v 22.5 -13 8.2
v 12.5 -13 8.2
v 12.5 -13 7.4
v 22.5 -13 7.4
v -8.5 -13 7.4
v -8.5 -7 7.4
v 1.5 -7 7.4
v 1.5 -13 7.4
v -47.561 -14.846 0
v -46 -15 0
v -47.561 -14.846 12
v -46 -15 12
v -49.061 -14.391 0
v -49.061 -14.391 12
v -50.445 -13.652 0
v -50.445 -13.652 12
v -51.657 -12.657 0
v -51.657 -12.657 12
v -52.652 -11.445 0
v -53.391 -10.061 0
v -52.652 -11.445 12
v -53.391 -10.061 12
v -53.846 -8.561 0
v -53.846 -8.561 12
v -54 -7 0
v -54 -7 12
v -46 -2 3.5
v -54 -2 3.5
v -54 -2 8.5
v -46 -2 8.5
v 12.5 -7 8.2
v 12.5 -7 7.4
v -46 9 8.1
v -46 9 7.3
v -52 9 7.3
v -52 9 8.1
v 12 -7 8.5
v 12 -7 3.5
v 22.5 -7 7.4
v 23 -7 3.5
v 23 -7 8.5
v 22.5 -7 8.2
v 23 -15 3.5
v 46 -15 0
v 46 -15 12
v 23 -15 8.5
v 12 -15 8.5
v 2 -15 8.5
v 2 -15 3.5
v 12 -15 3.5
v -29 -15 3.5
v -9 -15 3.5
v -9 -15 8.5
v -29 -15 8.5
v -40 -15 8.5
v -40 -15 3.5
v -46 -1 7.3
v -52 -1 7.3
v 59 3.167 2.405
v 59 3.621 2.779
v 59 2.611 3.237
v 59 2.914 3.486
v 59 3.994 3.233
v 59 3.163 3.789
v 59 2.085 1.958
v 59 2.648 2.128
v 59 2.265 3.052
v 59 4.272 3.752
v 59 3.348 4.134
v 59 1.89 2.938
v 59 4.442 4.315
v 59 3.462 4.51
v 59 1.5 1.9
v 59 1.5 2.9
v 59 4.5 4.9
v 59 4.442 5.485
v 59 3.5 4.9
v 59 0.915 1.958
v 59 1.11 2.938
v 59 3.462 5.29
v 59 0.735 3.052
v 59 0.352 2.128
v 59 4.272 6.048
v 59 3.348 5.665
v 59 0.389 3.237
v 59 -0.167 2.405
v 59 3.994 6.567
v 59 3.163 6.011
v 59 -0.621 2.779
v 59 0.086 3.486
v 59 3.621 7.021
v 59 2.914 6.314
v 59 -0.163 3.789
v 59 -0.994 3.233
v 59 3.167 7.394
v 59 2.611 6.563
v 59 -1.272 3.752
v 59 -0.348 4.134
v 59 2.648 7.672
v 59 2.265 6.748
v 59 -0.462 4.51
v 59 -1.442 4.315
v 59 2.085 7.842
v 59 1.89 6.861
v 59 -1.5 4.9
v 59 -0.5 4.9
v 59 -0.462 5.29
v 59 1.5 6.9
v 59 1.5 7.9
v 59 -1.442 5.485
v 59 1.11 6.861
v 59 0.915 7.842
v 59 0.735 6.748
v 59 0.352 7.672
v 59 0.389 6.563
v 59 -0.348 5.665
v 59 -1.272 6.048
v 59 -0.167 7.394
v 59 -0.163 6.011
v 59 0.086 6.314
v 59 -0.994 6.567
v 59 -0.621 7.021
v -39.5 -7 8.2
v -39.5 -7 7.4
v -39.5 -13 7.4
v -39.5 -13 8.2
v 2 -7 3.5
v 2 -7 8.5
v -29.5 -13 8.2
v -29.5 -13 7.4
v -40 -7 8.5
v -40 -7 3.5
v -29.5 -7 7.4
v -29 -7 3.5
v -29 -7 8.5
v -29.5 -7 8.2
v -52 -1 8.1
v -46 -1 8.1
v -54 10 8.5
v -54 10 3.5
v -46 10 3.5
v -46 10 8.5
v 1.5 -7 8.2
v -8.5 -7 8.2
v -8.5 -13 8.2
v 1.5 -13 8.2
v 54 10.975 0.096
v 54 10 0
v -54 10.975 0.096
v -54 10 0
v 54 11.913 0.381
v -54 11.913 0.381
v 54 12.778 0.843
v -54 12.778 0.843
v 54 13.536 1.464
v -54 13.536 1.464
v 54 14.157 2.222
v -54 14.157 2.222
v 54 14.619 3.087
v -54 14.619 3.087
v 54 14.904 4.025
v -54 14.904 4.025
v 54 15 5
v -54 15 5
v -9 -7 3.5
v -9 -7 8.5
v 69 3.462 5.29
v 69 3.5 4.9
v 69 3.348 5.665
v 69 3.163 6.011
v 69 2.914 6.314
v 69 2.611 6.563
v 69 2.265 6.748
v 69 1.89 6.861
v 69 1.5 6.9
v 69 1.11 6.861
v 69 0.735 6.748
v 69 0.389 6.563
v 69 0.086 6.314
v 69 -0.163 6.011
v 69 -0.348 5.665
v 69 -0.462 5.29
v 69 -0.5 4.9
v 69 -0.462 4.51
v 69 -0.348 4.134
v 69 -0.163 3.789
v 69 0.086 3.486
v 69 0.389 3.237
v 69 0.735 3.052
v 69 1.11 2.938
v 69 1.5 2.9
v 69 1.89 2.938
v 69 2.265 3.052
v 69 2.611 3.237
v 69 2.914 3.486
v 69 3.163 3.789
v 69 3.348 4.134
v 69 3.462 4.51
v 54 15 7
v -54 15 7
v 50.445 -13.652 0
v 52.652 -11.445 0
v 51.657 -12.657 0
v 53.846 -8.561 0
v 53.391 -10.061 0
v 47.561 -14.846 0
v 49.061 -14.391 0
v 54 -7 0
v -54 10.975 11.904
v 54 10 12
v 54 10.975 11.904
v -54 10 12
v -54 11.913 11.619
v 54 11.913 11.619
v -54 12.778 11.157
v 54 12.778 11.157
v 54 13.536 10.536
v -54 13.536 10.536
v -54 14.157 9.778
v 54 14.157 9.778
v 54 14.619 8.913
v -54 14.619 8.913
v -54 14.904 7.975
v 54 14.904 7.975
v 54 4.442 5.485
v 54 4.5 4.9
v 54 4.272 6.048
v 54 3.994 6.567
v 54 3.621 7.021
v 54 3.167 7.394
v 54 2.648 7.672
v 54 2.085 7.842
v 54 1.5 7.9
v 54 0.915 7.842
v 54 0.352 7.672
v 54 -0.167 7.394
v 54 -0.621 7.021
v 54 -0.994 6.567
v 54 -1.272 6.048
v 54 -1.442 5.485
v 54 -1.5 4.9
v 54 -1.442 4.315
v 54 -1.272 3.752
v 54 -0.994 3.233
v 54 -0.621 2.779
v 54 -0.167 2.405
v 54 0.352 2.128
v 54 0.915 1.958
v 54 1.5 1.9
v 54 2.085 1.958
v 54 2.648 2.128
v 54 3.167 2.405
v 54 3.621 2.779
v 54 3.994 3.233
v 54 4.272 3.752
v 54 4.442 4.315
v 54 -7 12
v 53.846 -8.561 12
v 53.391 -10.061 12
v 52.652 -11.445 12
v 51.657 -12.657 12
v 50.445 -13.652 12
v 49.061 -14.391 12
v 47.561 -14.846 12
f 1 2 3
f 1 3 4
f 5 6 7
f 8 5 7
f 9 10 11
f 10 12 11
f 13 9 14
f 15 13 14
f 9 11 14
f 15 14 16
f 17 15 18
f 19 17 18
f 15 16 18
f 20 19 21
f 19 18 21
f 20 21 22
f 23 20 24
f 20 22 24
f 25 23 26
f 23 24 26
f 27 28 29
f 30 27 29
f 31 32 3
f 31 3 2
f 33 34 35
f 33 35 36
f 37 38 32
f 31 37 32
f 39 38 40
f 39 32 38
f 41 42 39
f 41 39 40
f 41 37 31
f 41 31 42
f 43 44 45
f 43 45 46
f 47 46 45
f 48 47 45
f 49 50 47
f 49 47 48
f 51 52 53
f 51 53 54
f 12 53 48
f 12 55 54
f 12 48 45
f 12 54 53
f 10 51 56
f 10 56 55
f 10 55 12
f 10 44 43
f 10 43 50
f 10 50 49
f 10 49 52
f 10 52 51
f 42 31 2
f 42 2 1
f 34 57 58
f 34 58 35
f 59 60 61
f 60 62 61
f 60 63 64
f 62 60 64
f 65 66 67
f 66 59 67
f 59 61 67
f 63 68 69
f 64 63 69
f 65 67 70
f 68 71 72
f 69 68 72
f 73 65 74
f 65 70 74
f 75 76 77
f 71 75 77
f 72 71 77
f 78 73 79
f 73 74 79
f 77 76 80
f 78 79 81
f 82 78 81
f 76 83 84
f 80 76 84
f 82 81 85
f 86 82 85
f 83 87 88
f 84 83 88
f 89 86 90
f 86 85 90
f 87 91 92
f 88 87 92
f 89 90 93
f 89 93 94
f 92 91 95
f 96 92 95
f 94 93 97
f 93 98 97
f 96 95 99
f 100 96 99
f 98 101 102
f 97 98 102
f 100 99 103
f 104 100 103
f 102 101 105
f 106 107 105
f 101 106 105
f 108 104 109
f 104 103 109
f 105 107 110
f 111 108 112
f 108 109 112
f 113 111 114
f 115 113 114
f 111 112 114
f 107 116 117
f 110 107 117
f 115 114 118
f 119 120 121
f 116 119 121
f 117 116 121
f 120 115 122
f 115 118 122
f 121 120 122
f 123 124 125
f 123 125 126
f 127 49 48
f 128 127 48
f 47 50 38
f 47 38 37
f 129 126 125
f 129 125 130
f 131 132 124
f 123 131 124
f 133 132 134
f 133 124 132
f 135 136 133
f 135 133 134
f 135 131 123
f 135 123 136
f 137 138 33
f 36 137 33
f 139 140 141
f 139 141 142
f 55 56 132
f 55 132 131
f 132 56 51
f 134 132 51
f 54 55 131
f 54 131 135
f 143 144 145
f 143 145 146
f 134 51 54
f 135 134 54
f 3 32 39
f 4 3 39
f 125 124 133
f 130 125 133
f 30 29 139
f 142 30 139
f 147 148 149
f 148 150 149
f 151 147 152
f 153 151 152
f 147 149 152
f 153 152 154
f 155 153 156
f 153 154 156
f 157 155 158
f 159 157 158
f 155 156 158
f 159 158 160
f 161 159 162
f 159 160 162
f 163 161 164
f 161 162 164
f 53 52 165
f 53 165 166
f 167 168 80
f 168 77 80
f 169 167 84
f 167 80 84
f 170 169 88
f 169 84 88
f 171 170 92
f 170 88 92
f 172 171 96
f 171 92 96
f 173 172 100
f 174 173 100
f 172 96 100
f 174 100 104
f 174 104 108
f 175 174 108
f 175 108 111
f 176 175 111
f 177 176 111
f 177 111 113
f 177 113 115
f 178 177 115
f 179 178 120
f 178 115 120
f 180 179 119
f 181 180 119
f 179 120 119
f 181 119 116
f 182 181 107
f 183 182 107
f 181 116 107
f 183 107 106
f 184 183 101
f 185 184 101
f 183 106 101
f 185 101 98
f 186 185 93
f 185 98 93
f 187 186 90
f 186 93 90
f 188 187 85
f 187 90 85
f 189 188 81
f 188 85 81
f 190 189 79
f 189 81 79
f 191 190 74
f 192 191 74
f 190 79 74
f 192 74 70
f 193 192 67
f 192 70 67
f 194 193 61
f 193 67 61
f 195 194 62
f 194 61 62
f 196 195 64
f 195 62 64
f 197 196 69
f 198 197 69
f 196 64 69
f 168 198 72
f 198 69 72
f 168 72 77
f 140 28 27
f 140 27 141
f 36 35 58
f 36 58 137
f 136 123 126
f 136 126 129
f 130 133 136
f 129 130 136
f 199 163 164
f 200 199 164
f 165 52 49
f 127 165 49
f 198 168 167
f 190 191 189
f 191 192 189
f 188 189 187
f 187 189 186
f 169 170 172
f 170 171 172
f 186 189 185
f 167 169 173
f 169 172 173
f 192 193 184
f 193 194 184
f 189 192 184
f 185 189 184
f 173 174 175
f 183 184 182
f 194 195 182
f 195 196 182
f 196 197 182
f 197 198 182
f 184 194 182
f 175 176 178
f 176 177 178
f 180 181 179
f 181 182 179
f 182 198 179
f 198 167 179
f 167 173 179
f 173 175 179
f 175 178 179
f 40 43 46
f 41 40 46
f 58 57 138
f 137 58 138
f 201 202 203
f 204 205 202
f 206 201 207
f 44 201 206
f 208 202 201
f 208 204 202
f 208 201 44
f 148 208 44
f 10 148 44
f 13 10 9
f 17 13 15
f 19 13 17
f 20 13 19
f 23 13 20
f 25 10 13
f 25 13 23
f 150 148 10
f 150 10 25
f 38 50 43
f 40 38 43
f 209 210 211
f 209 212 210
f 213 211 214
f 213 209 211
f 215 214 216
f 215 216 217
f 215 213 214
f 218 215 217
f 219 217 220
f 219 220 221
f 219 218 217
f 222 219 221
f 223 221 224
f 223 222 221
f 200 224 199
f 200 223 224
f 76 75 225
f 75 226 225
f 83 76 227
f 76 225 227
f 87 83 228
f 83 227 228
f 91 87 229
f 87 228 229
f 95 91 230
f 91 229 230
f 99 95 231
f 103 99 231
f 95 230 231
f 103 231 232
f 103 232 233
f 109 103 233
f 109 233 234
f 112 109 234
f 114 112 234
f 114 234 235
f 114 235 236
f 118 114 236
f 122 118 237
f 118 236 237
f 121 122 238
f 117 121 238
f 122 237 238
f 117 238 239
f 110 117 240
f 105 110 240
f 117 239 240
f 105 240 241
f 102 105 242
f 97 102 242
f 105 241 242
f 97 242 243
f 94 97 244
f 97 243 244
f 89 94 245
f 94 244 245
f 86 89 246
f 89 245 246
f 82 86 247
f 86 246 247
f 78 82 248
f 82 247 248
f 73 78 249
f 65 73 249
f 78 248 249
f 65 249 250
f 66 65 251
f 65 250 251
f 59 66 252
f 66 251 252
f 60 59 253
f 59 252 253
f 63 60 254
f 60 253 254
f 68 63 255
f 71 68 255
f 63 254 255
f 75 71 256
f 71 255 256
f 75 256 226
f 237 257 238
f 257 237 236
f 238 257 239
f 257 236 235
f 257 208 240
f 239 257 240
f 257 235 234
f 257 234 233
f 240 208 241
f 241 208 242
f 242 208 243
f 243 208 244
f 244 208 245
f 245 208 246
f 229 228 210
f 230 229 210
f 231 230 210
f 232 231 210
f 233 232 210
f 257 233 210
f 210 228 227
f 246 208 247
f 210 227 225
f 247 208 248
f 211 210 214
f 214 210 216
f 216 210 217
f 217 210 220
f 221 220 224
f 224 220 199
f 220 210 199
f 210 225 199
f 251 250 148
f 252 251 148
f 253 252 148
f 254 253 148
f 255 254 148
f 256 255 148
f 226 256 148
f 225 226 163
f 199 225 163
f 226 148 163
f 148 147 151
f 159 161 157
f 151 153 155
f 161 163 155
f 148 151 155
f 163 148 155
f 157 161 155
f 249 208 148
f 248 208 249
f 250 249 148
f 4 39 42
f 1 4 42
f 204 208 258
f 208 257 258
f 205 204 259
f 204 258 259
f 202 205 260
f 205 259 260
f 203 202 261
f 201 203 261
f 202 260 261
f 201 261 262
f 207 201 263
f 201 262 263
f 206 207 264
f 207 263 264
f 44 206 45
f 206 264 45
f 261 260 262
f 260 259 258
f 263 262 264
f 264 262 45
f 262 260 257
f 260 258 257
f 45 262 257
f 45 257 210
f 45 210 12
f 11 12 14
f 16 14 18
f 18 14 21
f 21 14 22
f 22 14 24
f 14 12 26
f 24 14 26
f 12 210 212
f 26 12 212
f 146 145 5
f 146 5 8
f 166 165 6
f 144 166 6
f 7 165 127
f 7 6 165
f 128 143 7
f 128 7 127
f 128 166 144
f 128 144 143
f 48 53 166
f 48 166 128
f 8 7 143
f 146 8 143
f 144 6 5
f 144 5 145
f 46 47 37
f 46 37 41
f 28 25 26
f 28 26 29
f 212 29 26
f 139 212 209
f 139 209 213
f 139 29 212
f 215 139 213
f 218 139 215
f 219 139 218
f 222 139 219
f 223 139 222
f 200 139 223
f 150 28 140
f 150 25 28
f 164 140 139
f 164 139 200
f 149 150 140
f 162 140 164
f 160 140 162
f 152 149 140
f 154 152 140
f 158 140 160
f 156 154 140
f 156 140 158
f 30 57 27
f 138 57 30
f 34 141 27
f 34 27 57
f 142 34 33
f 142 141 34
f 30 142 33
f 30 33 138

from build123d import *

# Parameters (mm, degrees)
SKETCH_1_W          = 108
SKETCH_1_H          = 30
EXTRUDE_1_DEPTH     = 12
SKETCH_2_W          = 5
SKETCH_2_H          = 12
CUT_EXTRUDE_1_DEPTH = 8
SKETCH_3_W          = 0.8
SKETCH_3_H          = 10
EXTRUDE_2_DEPTH     = 6
SKETCH_4_W          = 11
SKETCH_4_H          = 5
CUT_EXTRUDE_2_DEPTH = 8
SKETCH_5_W          = 10
SKETCH_5_H          = 0.8
EXTRUDE_3_DEPTH     = 6
SKETCH_6_W          = 11
SKETCH_6_H          = 5
CUT_EXTRUDE_3_DEPTH = 8
SKETCH_7_W          = 10
SKETCH_7_H          = 0.8
EXTRUDE_4_DEPTH     = 6
SKETCH_8_W          = 11
SKETCH_8_H          = 5
CUT_EXTRUDE_4_DEPTH = 8
SKETCH_9_W          = 10
SKETCH_9_H          = 0.8
EXTRUDE_5_DEPTH     = 6
FILLET_1_R          = 5
FILLET_2_R          = 8


with BuildPart() as part:
    # 草图1 → 凸台-拉伸1 (new body)
    with BuildSketch(Plane(origin=(0, 0, 0), x_dir=(-1, 0, 0), z_dir=(0, 0, -1))):
        Rectangle(SKETCH_1_W, SKETCH_1_H)
    extrude(amount=-EXTRUDE_1_DEPTH)

    # 草图2 → 切除-拉伸1 (cut)
    with BuildSketch(Plane.ZY.offset(54)):
        with Locations((6, 4)):
            Rectangle(SKETCH_2_W, SKETCH_2_H)
    extrude(amount=-CUT_EXTRUDE_1_DEPTH, mode=Mode.SUBTRACT)

    # 草图3 → 凸台-拉伸2 (add)
    with BuildSketch(Plane.ZY.offset(46)):
        with Locations((7.7, 4)):
            Rectangle(SKETCH_3_W, SKETCH_3_H)
    extrude(amount=EXTRUDE_2_DEPTH)

    # 草图4 → 切除-拉伸2 (cut)
    with BuildSketch(Plane.XZ.offset(15)):
        with Locations((-34.5, 6)):
            Rectangle(SKETCH_4_W, SKETCH_4_H)
    extrude(amount=-CUT_EXTRUDE_2_DEPTH, mode=Mode.SUBTRACT)

    # 草图5 → 凸台-拉伸3 (add)
    with BuildSketch(Plane.XZ.offset(7)):
        with Locations((-34.5, 7.8)):
            Rectangle(SKETCH_5_W, SKETCH_5_H)
    extrude(amount=EXTRUDE_3_DEPTH)

    # 草图6 → 切除-拉伸3 (cut)
    with BuildSketch(Plane.XZ.offset(15)):
        with Locations((-3.5, 6)):
            Rectangle(SKETCH_6_W, SKETCH_6_H)
    extrude(amount=-CUT_EXTRUDE_3_DEPTH, mode=Mode.SUBTRACT)

    # 草图7 → 凸台-拉伸4 (add)
    with BuildSketch(Plane.XZ.offset(7)):
        with Locations((-3.5, 7.8)):
            Rectangle(SKETCH_7_W, SKETCH_7_H)
    extrude(amount=EXTRUDE_4_DEPTH)

    # 草图8 → 切除-拉伸4 (cut)
    with BuildSketch(Plane.XZ.offset(15)):
        with Locations((17.5, 6)):
            Rectangle(SKETCH_8_W, SKETCH_8_H)
    extrude(amount=-CUT_EXTRUDE_4_DEPTH, mode=Mode.SUBTRACT)

    # 草图9 → 凸台-拉伸5 (add)
    with BuildSketch(Plane.XZ.offset(7)):
        with Locations((17.5, 7.8)):
            Rectangle(SKETCH_9_W, SKETCH_9_H)
    extrude(amount=EXTRUDE_5_DEPTH)

    # 草图10 → 旋转1 (revolve)
    with BuildSketch(Plane.XY.offset(4.899865492)):
        Polygon((54, 4.5), (54, 1.5), (69, 1.5), (69, 3.5), (59, 3.5), (59, 4.5), align=None)
    revolve(axis=Axis((54, 1.5, 4.899865492), (1, 0, 0)))

    # 圆角1
    fillet_1_edges = [part.edges().sort_by_distance(p)[0] for p in [
        (0, 15, 12),
        (0, 15, 0),
    ]]
    fillet(fillet_1_edges, radius=FILLET_1_R)

    # 圆角2
    fillet_2_edges = [part.edges().sort_by_distance(p)[0] for p in [
        (-54, -15, 6),
        (54, -15, 6),
    ]]
    fillet(fillet_2_edges, radius=FILLET_2_R)


solid = part.part
